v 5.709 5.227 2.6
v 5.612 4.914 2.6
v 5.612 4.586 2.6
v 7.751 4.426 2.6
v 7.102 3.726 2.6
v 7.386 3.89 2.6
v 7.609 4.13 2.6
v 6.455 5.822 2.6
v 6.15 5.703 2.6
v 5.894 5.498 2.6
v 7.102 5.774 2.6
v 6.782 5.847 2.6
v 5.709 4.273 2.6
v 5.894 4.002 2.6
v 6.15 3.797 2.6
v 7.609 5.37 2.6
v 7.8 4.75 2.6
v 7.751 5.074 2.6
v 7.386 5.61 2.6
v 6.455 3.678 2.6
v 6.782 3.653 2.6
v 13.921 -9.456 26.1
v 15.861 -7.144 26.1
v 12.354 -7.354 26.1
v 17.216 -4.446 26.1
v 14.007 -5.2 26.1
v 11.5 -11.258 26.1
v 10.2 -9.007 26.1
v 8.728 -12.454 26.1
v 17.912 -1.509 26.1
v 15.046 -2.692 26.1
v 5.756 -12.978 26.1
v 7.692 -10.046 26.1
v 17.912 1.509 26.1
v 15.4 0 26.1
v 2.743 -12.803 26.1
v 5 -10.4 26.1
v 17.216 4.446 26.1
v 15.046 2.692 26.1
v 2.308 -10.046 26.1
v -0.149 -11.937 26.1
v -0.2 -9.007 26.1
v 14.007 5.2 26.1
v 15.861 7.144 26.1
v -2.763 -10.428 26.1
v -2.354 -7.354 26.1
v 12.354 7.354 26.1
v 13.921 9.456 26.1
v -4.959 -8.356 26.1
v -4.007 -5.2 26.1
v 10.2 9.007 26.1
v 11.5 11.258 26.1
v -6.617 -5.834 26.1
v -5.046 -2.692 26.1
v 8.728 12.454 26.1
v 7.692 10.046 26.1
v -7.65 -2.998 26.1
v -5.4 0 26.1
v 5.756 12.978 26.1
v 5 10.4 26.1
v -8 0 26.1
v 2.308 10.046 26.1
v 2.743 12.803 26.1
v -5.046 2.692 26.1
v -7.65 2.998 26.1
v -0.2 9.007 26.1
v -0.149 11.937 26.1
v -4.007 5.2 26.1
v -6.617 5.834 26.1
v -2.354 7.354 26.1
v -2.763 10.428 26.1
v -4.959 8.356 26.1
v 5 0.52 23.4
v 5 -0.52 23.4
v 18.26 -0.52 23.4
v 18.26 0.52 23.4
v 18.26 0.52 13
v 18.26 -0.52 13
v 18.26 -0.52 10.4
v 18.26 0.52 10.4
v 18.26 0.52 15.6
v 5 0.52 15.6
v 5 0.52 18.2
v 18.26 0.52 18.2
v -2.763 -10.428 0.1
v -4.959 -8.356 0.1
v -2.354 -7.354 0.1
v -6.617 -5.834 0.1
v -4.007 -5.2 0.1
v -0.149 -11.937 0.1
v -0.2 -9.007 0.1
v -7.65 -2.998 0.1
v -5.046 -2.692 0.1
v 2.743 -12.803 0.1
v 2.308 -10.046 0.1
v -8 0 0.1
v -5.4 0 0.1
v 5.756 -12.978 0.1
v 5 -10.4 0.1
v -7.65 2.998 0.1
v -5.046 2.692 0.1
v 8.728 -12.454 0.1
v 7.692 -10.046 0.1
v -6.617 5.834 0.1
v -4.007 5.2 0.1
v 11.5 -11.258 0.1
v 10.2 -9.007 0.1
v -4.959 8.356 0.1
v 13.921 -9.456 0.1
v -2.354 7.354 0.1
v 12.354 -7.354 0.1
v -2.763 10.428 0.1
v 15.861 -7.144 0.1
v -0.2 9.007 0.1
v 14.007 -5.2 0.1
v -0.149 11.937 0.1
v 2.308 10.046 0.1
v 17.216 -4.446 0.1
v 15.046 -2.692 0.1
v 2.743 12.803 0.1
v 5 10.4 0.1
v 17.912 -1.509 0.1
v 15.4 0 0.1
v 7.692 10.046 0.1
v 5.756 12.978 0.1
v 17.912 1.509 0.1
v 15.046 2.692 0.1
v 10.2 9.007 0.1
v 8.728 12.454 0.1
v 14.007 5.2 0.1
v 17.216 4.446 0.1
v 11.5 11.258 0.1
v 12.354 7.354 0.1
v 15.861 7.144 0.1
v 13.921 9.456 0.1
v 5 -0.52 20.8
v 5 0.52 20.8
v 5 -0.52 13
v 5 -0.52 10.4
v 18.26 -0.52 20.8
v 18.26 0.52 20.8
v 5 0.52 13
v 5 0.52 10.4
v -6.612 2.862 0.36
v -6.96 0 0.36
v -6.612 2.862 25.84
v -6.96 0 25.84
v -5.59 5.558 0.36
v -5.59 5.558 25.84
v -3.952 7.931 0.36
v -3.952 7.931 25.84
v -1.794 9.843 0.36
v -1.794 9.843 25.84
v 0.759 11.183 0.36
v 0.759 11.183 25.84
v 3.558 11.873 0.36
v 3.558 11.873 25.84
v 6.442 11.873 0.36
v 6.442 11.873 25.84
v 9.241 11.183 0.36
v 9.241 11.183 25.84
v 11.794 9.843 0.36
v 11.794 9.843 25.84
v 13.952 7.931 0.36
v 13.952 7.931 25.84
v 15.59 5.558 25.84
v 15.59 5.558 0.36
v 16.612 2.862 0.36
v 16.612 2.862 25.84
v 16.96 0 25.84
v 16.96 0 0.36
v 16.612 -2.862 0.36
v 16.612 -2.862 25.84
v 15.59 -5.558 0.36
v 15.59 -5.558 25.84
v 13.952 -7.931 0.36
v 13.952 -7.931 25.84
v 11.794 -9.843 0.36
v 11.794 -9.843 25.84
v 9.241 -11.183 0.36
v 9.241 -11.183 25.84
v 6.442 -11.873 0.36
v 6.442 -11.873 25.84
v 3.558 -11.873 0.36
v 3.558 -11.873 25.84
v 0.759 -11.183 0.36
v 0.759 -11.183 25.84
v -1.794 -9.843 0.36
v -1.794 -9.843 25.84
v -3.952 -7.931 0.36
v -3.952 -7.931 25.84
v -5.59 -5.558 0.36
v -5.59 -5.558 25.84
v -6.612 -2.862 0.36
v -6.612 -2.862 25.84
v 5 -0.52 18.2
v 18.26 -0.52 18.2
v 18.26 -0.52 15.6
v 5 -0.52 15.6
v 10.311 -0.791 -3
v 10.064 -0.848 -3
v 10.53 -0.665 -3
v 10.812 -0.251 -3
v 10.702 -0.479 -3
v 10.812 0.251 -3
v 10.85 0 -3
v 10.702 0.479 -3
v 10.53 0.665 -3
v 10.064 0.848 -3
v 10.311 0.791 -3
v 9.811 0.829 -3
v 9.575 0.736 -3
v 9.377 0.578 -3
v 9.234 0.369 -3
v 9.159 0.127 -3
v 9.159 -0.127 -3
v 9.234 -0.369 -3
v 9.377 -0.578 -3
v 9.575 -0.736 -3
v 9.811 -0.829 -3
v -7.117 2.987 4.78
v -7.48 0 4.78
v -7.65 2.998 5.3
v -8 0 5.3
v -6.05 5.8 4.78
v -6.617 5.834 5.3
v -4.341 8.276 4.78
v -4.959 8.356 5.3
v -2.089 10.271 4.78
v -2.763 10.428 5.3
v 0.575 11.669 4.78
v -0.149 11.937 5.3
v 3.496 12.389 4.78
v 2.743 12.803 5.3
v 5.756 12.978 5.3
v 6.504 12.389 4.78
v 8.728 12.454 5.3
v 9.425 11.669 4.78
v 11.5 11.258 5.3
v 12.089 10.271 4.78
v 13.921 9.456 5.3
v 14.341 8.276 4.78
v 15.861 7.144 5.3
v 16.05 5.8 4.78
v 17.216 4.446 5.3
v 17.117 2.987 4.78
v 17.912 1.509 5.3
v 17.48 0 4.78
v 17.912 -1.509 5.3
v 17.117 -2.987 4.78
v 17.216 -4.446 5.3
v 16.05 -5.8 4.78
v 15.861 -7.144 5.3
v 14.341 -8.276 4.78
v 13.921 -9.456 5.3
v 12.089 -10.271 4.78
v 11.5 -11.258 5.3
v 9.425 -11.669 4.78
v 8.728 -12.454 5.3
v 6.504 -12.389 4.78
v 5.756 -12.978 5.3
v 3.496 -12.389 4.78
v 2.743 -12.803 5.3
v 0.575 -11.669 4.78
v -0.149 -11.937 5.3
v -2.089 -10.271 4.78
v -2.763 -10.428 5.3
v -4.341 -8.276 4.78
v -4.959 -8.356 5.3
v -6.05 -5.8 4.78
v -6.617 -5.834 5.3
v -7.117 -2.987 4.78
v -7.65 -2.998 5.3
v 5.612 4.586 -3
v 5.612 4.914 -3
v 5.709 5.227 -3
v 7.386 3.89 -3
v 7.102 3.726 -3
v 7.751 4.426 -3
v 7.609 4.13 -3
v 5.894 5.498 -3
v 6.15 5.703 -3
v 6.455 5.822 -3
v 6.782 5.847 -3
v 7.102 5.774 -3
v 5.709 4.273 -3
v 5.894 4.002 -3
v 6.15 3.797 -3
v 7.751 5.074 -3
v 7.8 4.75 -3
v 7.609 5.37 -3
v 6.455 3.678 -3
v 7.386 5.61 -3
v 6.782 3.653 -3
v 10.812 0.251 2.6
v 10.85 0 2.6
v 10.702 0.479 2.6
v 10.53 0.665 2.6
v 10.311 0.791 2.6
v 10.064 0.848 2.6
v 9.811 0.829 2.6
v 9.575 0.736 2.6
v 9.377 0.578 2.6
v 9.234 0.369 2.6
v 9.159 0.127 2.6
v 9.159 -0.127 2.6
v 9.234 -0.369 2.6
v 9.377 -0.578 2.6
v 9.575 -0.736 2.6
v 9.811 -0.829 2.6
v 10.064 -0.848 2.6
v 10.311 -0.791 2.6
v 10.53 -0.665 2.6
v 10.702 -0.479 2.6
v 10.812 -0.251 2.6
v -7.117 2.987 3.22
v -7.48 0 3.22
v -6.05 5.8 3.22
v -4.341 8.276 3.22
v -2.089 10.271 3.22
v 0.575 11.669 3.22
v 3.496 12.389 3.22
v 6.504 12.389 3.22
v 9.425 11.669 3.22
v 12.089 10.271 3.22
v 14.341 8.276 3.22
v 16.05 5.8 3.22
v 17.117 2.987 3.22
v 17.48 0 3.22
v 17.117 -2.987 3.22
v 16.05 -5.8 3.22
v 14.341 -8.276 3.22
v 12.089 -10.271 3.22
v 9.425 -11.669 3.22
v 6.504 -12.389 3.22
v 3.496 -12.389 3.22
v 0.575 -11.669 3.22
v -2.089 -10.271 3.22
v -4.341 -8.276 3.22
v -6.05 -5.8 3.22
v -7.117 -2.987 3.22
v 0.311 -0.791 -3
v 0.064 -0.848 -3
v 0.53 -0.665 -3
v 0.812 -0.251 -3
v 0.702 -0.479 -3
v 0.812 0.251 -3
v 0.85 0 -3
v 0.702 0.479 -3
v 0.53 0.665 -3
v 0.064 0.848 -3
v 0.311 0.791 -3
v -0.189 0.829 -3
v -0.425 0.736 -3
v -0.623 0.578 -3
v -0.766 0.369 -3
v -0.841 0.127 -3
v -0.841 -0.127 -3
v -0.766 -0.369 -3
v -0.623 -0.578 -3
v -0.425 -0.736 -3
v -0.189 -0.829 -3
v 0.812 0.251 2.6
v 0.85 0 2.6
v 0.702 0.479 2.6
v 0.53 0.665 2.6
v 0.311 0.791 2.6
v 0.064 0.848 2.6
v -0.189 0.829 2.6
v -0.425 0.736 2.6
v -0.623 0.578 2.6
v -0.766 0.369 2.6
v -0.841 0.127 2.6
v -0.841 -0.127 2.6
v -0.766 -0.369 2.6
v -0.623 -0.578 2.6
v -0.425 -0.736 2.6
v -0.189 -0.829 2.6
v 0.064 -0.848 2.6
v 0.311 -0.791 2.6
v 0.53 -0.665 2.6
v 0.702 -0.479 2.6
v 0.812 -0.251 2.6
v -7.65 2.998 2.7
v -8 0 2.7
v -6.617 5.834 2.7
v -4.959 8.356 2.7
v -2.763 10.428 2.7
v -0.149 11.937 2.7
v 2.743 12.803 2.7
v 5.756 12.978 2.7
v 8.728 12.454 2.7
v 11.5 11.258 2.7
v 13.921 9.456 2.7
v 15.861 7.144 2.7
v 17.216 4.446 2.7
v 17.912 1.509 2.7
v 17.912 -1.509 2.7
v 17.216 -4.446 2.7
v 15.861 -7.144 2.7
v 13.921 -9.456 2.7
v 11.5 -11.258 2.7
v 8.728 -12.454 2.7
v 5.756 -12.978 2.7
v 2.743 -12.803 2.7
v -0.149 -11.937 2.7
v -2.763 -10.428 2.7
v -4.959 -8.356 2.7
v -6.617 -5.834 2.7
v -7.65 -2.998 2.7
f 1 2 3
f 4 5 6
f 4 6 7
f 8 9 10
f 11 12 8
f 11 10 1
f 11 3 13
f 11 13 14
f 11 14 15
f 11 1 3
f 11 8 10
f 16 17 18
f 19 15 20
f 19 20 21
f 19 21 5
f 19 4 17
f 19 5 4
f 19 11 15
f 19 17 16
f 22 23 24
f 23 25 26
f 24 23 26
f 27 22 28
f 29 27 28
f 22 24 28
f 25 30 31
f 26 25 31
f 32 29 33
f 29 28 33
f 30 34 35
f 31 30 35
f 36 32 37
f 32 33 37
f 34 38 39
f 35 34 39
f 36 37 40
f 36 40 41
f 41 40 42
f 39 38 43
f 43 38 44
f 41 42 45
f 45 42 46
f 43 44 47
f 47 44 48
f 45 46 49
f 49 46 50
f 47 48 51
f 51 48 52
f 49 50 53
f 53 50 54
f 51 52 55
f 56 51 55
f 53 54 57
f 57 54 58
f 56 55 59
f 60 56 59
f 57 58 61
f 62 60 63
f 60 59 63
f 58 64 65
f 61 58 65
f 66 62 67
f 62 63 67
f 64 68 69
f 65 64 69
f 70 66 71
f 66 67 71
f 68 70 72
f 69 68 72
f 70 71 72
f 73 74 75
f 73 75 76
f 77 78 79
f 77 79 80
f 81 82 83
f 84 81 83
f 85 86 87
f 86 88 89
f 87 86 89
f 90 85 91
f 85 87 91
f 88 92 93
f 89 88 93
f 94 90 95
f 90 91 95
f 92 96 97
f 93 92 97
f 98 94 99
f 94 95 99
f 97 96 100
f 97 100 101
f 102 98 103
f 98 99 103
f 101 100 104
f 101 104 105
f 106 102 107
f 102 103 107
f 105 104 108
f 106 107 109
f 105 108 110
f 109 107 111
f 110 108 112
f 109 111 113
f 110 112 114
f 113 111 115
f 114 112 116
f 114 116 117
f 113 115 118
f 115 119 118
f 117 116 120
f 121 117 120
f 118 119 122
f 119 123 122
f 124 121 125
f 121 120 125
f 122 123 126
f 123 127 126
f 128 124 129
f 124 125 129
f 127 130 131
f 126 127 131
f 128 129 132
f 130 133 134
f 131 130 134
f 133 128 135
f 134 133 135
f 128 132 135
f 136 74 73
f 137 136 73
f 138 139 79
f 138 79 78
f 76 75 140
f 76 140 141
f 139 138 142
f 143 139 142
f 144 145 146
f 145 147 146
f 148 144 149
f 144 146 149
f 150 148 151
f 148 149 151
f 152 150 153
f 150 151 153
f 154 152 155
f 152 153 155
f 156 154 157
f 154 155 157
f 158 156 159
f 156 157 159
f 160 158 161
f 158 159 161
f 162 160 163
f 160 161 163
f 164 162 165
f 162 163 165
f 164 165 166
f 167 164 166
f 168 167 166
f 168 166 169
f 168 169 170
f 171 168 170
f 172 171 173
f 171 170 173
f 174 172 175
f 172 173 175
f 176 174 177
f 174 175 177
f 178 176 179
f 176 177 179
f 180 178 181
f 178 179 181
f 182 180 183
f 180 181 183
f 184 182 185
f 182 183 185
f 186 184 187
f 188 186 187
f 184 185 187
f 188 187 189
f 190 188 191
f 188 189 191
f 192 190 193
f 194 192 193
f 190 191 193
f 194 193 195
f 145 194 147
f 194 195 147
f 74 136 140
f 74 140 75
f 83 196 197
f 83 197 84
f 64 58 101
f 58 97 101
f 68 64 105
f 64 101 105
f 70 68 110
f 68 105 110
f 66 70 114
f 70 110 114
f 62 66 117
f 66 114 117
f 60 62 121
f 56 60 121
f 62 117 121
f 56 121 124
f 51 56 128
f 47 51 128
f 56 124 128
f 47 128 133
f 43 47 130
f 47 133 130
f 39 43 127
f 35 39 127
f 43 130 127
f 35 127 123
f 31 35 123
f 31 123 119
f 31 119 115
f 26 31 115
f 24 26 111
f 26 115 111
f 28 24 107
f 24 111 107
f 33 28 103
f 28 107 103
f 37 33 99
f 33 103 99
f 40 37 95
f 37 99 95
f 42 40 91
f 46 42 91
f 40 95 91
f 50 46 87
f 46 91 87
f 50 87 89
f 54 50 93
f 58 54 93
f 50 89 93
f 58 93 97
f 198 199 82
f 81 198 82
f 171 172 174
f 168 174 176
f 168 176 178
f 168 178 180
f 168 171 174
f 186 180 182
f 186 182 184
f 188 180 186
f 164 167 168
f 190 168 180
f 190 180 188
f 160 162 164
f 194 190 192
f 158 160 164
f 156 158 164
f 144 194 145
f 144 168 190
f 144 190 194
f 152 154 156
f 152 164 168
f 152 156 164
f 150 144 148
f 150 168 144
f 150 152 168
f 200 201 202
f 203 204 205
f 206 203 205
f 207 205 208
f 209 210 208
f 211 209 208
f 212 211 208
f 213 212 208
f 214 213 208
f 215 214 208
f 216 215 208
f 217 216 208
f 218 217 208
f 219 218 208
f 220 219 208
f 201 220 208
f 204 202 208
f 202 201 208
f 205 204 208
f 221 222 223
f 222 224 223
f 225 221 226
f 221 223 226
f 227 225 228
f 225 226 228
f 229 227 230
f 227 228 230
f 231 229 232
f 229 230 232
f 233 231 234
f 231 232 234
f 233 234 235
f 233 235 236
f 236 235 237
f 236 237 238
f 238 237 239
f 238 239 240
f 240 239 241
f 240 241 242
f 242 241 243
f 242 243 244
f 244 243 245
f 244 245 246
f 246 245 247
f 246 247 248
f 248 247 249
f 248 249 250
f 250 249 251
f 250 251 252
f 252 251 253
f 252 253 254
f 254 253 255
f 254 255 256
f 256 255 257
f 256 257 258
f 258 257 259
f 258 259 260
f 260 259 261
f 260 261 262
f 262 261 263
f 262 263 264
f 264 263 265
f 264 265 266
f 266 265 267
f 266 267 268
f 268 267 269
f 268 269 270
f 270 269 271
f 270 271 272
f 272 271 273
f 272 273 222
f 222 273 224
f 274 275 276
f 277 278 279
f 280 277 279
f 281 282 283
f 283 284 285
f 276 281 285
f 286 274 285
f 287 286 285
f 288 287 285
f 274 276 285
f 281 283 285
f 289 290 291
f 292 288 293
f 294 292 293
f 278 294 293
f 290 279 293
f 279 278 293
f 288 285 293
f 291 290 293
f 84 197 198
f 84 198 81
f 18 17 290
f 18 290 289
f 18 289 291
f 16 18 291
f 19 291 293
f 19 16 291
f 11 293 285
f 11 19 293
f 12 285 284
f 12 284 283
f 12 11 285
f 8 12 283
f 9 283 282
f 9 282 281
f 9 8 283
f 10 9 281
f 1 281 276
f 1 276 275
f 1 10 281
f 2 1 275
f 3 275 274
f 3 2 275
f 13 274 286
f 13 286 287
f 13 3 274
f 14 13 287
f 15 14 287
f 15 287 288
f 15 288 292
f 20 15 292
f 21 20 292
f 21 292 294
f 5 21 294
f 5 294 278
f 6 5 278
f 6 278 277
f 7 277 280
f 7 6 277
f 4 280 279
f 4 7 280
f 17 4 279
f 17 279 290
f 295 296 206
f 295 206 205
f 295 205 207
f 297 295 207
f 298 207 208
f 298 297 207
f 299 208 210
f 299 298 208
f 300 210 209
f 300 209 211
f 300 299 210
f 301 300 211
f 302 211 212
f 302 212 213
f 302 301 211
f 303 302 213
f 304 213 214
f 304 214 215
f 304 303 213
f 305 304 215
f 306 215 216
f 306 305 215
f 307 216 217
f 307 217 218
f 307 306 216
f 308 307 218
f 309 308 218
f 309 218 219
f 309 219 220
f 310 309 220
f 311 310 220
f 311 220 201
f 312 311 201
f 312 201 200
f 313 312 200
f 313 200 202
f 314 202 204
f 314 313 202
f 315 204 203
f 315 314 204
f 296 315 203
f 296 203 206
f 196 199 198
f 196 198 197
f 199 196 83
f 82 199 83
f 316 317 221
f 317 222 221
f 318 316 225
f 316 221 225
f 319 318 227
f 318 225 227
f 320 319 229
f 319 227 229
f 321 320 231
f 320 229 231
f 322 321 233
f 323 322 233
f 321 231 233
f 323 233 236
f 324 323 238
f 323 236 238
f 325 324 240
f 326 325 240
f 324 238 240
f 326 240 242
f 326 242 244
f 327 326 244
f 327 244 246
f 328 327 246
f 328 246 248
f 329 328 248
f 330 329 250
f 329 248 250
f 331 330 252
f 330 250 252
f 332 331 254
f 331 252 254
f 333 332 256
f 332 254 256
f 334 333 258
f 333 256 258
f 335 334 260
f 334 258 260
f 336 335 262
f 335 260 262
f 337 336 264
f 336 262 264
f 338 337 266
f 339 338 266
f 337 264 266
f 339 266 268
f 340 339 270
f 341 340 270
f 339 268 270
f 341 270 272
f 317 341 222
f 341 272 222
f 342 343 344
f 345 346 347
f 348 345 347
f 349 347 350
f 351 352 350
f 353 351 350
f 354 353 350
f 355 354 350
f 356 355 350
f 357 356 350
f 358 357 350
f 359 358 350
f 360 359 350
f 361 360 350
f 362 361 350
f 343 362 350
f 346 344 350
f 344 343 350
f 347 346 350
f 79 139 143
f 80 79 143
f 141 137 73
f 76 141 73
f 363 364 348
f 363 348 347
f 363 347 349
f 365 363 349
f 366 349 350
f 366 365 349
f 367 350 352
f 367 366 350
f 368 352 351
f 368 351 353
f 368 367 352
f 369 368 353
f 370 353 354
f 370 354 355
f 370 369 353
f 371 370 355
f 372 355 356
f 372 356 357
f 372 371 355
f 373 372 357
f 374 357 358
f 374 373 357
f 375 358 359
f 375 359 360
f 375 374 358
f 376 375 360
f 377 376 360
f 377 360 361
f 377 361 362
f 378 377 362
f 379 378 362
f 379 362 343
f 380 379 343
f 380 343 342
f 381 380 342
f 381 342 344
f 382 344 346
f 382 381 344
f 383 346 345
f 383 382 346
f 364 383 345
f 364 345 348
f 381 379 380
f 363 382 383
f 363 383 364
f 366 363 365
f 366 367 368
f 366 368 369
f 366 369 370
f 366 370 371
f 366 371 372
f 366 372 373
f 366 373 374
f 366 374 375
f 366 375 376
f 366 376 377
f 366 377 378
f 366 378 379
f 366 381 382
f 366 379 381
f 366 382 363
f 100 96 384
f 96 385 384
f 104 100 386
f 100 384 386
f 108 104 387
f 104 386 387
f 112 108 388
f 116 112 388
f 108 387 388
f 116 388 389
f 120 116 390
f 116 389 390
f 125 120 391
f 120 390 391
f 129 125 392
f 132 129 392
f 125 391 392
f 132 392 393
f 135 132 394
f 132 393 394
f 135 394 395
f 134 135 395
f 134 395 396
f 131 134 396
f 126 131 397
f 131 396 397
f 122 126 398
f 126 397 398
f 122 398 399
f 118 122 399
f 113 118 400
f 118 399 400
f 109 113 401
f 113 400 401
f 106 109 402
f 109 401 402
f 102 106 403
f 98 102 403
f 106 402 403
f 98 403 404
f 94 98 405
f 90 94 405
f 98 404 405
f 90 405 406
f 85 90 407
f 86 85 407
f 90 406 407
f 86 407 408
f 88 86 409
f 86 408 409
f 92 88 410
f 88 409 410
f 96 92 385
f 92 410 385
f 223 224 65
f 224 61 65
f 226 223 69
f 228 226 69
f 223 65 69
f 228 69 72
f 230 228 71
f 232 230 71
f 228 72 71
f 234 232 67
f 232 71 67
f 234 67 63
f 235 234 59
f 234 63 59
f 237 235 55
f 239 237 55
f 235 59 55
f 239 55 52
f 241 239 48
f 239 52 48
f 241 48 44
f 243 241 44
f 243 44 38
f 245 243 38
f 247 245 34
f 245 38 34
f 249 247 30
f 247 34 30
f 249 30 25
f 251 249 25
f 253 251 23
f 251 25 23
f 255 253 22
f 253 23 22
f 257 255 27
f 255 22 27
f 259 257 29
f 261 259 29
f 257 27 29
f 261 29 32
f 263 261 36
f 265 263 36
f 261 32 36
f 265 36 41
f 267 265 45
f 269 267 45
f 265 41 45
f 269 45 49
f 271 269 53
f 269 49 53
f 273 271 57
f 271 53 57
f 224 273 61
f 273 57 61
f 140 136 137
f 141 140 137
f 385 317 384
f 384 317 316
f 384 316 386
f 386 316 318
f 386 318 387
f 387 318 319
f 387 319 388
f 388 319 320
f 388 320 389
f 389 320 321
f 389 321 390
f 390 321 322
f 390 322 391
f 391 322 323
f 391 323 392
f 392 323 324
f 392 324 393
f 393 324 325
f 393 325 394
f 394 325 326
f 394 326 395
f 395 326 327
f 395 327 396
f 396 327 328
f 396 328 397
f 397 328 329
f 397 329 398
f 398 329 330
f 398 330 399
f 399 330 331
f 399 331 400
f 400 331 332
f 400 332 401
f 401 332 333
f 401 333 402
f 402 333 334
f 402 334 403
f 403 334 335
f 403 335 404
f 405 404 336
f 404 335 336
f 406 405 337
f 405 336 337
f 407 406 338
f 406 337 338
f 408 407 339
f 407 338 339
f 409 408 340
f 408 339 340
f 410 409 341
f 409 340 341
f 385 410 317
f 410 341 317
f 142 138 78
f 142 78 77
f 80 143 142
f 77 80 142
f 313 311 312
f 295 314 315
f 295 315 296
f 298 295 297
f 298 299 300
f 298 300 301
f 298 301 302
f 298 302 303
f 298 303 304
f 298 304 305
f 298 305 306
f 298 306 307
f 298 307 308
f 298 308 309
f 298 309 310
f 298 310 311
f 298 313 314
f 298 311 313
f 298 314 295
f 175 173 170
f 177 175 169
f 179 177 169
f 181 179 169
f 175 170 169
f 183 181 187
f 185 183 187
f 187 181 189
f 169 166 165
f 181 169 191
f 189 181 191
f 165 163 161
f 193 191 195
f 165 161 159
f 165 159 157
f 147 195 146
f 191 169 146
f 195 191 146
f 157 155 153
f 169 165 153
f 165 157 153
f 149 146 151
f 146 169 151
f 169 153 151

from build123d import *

# Parameters (mm, degrees)
SKETCH002_W   = 11.96
SKETCH002_H   = 25.48
SKETCH003_R   = 0.85
SKETCH003_R_2 = 1.1
PAD_DEPTH     = 5.6
SKETCH004_W   = 1.04
SKETCH004_H   = 2.6
PAD001_DEPTH  = 13.26


with BuildPart() as revolution:
    # Sketch → Revolution (revolve)
    with BuildSketch(Plane.XZ):
        Polygon((-8, 0.1), (-8, 2.7), (-7.48, 3.22), (-7.48, 4.78), (-8, 5.3), (-8, 26.1), (-5.4, 26.1), (-5.4, 0.1), align=None)
    revolve(axis=Axis((5, 0, 7.548619), (0, 0, -1)))


with BuildPart() as revolution001:
    # Sketch002 → Revolution001 (revolve)
    with BuildSketch(Plane.XZ):
        with Locations((-0.98, 13.1)):
            Rectangle(SKETCH002_W, SKETCH002_H)
    revolve(axis=Axis((5, 0, 4.680116), (0, 0, -1)))


with BuildPart() as pad:
    # Sketch003 → Pad (new body)
    with BuildSketch(Plane.XY.offset(2.6)):
        Circle(SKETCH003_R)
        with Locations((10, 0)):
            Circle(SKETCH003_R)
        with Locations((6.7, 4.75)):
            Circle(SKETCH003_R_2)
    extrude(amount=-PAD_DEPTH)


with BuildPart() as pad001:
    # Sketch004 → Pad001 (new body)
    with BuildSketch(Plane.YZ.offset(5)):
        with Locations((0, 11.7)):
            Rectangle(SKETCH004_W, SKETCH004_H)
        with Locations((0, 16.9)):
            Rectangle(SKETCH004_W, SKETCH004_H)
        with Locations((0, 22.1)):
            Rectangle(SKETCH004_W, SKETCH004_H)
    extrude(amount=PAD001_DEPTH)


solid = Compound([revolution.part, revolution001.part, pad.part, pad001.part])
